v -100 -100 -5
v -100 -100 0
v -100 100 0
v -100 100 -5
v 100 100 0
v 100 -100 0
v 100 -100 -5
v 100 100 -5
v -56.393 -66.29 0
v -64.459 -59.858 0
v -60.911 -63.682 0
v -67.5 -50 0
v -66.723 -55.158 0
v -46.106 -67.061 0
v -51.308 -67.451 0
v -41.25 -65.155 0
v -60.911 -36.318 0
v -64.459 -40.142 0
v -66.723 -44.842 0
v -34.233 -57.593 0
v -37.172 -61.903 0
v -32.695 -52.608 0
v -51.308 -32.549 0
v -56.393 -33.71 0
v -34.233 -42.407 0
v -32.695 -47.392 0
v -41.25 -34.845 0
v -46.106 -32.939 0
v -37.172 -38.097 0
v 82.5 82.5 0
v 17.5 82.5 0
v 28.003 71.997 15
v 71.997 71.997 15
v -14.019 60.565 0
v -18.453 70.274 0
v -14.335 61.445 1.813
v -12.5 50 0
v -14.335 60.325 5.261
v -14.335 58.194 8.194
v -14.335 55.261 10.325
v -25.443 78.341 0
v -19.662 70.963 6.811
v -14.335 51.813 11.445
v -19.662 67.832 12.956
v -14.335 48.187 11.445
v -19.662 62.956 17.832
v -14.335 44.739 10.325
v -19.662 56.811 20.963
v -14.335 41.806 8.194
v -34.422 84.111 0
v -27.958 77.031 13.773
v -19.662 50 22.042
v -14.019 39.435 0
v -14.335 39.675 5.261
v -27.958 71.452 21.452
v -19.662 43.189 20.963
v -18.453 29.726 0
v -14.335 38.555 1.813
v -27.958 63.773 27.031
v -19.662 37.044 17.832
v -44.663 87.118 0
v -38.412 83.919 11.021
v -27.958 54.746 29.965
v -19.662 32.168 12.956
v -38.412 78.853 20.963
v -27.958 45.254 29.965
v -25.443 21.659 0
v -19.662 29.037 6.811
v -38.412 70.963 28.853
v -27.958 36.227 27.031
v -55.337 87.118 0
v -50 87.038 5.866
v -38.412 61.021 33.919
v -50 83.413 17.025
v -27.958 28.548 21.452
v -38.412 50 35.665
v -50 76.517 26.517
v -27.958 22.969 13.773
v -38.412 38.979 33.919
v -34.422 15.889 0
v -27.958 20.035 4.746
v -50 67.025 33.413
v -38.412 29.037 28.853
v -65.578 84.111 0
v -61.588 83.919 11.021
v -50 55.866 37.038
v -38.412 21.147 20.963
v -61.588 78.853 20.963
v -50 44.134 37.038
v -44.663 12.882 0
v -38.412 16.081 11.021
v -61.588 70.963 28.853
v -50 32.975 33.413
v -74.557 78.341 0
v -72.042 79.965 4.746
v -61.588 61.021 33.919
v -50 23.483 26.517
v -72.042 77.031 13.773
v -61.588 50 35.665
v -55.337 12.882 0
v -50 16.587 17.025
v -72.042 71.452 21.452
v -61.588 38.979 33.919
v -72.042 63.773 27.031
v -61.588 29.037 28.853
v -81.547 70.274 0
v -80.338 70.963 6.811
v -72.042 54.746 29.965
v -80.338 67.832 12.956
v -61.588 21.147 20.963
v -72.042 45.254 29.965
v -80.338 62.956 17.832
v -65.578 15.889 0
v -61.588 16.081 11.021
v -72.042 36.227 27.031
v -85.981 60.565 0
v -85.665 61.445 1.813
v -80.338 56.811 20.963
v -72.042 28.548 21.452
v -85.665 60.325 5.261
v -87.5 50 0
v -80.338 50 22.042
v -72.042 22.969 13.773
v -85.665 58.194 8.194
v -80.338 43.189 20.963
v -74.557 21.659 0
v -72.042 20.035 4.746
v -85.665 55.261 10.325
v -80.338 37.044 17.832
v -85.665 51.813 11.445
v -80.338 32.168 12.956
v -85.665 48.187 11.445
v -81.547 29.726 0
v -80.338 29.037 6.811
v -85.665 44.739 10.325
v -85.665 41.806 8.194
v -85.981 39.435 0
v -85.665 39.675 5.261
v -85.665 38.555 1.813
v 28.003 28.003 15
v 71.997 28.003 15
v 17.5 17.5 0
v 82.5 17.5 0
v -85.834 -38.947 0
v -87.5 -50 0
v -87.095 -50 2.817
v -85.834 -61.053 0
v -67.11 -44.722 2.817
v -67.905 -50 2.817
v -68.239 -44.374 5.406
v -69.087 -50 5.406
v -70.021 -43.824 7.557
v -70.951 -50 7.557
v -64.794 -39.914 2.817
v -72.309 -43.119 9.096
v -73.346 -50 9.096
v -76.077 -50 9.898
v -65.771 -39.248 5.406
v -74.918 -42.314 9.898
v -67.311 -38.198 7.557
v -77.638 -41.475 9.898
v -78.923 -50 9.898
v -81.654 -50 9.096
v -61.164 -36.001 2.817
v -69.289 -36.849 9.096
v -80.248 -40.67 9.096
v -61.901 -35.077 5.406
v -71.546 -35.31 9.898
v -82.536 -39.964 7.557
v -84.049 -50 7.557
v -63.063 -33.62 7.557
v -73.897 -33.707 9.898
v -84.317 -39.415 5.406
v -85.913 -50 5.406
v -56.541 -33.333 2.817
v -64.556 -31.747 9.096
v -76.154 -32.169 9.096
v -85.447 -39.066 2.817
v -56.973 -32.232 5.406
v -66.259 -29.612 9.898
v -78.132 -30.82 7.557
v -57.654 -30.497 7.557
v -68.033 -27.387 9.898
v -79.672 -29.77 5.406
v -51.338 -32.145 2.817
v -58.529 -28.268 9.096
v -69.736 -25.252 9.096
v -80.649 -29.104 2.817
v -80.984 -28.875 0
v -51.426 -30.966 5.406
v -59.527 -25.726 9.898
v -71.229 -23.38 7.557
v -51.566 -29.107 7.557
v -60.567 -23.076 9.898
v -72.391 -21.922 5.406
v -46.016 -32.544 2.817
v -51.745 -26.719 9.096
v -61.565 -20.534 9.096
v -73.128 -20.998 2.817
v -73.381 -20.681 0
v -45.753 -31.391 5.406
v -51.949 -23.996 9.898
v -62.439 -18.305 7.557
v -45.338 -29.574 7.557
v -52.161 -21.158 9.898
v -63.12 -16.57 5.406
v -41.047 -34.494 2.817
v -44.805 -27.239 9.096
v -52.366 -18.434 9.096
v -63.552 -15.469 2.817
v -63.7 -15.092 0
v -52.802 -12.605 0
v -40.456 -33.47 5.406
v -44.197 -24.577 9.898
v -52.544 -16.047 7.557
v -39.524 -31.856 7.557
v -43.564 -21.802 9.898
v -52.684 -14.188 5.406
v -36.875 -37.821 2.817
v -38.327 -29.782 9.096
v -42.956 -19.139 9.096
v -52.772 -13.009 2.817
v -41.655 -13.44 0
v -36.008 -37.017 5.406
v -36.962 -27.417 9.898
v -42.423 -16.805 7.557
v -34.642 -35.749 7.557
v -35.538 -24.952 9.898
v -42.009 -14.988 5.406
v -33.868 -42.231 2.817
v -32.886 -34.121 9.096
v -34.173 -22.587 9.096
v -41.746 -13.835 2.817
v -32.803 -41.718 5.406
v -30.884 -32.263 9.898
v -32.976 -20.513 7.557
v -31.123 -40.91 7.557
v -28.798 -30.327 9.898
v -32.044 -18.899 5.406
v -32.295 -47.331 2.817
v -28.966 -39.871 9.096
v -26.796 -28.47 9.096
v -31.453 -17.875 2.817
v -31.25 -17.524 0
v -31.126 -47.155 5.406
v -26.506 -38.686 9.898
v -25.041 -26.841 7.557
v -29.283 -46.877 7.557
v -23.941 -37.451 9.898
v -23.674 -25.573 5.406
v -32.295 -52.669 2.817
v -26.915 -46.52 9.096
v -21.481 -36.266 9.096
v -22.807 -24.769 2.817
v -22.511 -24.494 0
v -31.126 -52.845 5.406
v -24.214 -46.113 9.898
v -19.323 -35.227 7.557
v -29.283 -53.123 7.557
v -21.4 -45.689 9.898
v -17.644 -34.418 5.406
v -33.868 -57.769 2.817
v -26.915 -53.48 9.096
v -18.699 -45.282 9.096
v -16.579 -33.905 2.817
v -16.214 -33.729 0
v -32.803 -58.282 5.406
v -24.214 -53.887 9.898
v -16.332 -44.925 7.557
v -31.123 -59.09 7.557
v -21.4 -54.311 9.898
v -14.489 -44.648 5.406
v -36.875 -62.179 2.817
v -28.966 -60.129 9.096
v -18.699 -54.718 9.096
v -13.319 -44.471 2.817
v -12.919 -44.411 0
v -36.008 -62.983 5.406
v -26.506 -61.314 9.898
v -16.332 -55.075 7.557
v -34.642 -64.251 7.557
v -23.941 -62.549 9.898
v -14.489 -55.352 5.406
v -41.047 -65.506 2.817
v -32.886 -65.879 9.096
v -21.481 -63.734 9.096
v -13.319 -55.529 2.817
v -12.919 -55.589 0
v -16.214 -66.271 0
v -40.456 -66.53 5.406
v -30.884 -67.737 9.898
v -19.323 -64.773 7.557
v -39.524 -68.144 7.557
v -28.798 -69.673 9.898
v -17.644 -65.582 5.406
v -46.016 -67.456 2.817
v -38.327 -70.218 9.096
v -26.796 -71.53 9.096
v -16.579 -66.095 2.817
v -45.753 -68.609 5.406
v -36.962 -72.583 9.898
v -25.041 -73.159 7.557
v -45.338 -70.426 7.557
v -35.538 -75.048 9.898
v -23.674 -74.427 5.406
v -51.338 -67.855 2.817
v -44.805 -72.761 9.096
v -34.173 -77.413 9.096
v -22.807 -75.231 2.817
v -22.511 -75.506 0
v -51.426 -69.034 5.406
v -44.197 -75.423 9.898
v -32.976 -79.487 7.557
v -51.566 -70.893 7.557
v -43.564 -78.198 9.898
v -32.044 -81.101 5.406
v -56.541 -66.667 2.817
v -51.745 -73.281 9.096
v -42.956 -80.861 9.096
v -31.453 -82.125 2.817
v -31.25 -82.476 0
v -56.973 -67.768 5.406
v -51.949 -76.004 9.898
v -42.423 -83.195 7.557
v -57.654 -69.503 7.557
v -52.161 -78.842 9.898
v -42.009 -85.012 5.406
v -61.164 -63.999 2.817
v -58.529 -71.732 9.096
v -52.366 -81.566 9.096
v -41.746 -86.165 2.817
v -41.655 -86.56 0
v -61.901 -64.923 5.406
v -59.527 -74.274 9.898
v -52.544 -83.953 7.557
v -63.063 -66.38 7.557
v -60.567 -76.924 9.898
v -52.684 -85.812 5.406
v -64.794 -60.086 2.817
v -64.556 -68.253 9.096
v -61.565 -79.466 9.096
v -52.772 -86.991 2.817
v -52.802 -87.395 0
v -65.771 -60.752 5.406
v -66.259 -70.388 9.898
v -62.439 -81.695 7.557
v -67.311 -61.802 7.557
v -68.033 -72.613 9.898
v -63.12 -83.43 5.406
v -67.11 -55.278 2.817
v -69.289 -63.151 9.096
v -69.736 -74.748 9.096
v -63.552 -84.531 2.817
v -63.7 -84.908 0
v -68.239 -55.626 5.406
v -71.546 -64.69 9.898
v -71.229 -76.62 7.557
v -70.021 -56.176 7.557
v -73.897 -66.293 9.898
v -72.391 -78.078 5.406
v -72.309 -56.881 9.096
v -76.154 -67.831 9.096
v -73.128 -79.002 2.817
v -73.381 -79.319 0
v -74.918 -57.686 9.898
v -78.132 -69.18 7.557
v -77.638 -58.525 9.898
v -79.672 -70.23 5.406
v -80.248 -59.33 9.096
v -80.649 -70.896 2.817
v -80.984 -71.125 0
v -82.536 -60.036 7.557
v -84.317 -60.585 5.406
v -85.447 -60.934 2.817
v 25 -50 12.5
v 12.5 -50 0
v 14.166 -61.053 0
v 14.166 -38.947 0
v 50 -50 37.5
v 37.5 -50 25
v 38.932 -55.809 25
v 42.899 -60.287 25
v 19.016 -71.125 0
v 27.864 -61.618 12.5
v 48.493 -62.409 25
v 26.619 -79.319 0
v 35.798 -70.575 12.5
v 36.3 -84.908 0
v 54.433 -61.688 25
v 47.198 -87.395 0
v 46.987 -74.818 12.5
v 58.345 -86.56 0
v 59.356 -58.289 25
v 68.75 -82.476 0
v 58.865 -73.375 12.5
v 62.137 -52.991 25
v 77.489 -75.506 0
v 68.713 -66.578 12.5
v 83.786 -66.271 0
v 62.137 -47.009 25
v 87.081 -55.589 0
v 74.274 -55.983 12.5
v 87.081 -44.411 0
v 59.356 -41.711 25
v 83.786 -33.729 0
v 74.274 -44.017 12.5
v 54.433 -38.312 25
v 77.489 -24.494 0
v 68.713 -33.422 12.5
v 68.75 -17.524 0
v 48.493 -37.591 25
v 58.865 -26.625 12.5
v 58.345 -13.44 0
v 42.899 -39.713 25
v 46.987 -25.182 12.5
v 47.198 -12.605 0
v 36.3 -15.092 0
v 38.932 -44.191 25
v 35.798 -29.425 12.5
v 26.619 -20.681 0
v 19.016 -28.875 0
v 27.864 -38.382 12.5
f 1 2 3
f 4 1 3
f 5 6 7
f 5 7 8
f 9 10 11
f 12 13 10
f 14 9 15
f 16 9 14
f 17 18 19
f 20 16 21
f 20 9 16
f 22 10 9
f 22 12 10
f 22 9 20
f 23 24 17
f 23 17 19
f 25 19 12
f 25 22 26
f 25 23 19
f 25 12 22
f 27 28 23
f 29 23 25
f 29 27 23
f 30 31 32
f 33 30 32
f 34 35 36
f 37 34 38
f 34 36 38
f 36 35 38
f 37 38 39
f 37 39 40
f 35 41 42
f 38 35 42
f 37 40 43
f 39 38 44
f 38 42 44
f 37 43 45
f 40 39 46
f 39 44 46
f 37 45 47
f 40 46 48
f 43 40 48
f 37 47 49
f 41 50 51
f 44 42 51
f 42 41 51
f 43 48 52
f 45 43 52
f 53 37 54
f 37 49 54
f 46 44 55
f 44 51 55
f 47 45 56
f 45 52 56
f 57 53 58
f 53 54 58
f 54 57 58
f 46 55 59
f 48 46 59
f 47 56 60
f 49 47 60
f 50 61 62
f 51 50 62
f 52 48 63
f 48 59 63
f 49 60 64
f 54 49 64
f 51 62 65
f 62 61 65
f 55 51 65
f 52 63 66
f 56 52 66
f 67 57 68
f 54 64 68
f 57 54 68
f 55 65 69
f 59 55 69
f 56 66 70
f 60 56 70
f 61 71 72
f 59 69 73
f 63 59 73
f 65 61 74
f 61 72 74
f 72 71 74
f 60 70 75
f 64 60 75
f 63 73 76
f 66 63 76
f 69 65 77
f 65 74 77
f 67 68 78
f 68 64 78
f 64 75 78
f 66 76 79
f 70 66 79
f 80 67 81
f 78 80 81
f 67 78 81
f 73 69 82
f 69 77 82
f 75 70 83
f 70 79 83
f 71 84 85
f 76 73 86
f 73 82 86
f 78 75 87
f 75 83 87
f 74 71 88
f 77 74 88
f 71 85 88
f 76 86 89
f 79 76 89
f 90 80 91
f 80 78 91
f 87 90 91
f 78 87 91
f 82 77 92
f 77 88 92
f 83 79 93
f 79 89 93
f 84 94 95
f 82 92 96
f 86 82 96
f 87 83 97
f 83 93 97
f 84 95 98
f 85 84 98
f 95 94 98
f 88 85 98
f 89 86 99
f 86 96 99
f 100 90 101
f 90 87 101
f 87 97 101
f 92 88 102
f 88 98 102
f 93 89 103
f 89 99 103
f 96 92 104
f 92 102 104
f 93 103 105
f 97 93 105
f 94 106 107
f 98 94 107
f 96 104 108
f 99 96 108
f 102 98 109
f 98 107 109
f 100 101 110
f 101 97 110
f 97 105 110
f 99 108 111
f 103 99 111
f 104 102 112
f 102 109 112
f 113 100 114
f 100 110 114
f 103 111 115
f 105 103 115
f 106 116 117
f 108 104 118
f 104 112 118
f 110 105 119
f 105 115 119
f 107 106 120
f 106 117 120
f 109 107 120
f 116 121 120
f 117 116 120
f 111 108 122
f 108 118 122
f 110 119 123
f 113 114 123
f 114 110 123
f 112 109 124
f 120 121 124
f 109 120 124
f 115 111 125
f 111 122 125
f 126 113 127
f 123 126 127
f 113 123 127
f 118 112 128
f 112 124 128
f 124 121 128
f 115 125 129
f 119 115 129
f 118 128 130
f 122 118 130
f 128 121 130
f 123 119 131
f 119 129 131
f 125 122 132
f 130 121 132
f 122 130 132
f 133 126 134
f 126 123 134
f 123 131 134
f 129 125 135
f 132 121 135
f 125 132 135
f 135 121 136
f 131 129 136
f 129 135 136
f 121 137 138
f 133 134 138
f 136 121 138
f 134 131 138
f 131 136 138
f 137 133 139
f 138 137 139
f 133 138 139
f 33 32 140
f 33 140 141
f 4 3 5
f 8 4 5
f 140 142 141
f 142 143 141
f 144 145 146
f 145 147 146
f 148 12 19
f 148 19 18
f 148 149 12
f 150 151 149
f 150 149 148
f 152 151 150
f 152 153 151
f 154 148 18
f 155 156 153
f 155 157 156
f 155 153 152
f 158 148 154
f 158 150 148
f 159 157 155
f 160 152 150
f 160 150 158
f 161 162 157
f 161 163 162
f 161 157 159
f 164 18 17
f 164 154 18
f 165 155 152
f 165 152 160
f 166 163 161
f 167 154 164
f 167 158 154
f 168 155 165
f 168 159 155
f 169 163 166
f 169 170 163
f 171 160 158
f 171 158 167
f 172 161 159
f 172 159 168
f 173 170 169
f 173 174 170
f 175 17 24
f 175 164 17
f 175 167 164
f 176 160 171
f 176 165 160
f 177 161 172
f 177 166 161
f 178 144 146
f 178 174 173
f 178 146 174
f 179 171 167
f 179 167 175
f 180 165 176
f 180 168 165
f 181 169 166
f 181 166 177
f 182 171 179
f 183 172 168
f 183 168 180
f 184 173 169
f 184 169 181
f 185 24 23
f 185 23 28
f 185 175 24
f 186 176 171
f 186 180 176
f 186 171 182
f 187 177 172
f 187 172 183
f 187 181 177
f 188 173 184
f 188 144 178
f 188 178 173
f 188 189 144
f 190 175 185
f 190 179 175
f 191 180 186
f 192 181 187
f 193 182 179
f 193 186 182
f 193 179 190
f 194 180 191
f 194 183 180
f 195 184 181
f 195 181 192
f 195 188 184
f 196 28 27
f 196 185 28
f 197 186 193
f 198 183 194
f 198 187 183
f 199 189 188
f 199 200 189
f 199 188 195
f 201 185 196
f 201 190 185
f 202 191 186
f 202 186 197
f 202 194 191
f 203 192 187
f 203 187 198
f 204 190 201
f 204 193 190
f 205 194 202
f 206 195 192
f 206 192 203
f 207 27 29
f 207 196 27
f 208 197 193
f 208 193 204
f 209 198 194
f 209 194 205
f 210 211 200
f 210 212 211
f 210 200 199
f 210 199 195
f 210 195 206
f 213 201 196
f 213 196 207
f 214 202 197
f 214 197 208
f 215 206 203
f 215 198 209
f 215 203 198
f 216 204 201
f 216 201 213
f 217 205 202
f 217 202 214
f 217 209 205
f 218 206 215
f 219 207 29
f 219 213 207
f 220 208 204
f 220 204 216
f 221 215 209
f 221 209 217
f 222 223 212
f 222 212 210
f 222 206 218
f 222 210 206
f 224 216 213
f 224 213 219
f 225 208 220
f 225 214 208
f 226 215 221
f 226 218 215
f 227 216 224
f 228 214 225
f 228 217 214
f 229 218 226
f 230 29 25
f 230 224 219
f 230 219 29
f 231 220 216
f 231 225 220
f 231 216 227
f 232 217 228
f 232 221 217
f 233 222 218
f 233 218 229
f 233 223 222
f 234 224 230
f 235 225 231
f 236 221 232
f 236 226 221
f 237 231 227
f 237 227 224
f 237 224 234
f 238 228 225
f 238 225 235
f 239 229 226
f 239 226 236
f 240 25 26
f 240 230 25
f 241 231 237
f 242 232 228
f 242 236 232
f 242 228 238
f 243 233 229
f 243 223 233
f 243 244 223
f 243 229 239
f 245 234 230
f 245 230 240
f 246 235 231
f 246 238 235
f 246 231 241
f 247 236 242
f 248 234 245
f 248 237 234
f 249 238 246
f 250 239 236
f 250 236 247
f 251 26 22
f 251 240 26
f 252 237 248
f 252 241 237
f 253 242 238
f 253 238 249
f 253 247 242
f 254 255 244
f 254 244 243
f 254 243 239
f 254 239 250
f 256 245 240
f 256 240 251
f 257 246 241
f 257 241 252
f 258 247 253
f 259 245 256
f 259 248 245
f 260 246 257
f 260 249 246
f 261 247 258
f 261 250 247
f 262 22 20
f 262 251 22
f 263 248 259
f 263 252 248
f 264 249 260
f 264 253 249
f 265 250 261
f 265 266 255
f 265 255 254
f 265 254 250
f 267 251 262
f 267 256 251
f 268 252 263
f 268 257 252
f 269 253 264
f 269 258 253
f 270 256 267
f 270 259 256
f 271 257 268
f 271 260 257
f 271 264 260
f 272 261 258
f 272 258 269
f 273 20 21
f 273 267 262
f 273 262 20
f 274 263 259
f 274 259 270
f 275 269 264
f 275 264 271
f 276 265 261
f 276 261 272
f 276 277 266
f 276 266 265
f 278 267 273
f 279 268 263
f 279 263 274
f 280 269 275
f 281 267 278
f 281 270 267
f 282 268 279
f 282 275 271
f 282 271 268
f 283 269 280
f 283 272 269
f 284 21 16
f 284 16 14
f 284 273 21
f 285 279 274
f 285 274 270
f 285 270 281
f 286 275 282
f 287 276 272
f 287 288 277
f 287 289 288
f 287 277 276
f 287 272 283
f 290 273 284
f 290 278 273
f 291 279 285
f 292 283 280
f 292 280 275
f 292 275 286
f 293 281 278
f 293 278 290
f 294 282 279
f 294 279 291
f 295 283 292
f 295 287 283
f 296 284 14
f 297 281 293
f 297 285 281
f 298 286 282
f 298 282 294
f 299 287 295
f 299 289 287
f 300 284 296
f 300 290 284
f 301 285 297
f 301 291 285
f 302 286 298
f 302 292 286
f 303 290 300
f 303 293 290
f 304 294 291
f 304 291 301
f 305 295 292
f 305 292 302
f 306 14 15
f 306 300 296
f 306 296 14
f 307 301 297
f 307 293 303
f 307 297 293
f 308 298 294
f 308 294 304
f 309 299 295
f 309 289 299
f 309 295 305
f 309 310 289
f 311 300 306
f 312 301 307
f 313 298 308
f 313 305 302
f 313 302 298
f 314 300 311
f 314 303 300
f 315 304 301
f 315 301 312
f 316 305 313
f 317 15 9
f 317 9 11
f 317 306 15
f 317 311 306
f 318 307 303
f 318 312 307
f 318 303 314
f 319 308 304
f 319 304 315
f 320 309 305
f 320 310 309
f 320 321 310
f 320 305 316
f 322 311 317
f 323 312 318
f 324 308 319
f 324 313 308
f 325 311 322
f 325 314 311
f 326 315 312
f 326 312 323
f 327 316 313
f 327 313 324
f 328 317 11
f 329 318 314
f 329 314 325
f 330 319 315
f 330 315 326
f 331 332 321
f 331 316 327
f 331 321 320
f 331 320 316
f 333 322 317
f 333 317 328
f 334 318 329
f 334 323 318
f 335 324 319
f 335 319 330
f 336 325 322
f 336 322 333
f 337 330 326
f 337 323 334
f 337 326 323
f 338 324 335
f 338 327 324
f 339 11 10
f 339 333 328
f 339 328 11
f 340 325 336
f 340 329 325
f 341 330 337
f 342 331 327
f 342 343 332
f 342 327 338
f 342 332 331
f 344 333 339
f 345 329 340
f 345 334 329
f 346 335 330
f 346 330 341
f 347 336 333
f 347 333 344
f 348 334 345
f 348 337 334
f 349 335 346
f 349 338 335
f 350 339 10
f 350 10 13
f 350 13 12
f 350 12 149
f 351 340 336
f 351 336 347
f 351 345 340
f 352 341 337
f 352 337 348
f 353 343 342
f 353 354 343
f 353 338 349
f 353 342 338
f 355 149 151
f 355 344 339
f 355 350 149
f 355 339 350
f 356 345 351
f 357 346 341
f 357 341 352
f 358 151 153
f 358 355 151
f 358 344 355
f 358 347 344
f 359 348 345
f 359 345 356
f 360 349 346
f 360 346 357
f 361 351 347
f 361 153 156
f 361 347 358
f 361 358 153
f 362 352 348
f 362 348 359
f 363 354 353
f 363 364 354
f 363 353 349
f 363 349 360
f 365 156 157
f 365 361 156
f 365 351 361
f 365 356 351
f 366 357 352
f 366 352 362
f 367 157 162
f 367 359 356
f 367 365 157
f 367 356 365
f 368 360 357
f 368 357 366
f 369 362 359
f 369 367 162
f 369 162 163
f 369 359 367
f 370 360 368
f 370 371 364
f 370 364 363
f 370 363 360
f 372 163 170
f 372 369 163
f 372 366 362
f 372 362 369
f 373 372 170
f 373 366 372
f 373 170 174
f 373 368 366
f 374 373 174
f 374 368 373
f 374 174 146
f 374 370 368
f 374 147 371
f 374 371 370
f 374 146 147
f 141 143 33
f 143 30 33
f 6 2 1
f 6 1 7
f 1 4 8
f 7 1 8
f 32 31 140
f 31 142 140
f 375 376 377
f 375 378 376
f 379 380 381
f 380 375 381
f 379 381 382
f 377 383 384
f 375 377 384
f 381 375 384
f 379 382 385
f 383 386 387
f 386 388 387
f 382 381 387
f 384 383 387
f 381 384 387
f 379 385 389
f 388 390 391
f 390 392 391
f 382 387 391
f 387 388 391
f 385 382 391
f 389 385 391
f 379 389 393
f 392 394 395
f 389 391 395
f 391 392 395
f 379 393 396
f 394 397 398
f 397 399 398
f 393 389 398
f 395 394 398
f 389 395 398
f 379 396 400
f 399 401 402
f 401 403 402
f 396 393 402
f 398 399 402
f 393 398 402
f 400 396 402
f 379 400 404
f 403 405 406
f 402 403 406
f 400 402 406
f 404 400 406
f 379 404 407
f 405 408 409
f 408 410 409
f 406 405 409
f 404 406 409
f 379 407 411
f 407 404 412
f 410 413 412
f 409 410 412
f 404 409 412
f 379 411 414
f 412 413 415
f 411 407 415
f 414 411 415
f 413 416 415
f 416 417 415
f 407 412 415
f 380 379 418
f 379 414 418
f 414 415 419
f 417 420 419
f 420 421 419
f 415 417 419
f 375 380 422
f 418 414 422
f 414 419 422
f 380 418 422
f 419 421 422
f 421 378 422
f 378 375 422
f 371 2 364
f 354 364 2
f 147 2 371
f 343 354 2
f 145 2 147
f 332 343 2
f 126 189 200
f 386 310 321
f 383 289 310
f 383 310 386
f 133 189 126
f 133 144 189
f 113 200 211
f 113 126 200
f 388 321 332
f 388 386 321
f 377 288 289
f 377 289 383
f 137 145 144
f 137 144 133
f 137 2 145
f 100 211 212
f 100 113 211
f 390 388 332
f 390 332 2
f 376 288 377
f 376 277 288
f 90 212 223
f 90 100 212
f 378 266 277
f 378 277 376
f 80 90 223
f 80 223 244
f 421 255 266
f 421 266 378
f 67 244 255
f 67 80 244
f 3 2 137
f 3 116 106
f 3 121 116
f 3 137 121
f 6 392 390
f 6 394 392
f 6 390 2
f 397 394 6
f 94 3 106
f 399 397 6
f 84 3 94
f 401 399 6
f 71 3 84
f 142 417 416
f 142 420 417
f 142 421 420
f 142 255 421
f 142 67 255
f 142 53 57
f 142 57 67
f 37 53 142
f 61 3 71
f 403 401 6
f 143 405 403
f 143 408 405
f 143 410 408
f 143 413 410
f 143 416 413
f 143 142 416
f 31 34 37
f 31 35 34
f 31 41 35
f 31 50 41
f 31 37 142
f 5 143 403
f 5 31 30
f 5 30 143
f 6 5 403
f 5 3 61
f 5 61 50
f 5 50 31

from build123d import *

# Parameters (mm, degrees)
F0_W     = 200
F0_H     = 200
F1_DEPTH = 5
F3_ANGLE = 180
F4_W     = 65
F4_H     = 65
F5_DEPTH = 15
F5_TAPER = 35


with BuildPart() as f1:
    # F0 (on Top) → F1 (new body)
    with BuildSketch(Plane.XY):
        Rectangle(F0_W, F0_H)
    extrude(amount=-F1_DEPTH)

    # F2 (on Top) → F3 (revolve)
    with BuildSketch(Plane.XY):
        with BuildLine():
            Line((-87.5, 50), (-12.5, 50))
            ThreePointArc((-12.5, 50), (-50, 87.5), (-87.5, 50))
        make_face()
    revolve(axis=Axis((-50, 50, 0), (1, 0, 0)), revolution_arc=F3_ANGLE)

    # F4 (on Top) → F5 (join)
    with BuildSketch(Plane.XY):
        with Locations((50, 50)):
            Rectangle(F4_W, F4_H)
    extrude(amount=F5_DEPTH, taper=F5_TAPER)

    # F7 (on plane+point) → F8 (revolve)
    with BuildSketch(Plane.XZ.offset(50)):
        with BuildLine():
            Line((-87.5, 0), (-67.5, 0))
            ThreePointArc((-67.5, 0), (-77.5, 10), (-87.5, 0))
        make_face()
    revolve(axis=Axis((-50, -50, -2.7900552377), (0, 0, -1)))

    # F9 (on plane+point) → F10 (revolve)
    with BuildSketch(Plane.XZ.offset(50)):
        Polygon((50, 37.5), (12.5, 0), (50, 0), align=None)
    revolve(axis=Axis((50, -50, 18.75), (0, 0, 1)))


solid = f1.part
